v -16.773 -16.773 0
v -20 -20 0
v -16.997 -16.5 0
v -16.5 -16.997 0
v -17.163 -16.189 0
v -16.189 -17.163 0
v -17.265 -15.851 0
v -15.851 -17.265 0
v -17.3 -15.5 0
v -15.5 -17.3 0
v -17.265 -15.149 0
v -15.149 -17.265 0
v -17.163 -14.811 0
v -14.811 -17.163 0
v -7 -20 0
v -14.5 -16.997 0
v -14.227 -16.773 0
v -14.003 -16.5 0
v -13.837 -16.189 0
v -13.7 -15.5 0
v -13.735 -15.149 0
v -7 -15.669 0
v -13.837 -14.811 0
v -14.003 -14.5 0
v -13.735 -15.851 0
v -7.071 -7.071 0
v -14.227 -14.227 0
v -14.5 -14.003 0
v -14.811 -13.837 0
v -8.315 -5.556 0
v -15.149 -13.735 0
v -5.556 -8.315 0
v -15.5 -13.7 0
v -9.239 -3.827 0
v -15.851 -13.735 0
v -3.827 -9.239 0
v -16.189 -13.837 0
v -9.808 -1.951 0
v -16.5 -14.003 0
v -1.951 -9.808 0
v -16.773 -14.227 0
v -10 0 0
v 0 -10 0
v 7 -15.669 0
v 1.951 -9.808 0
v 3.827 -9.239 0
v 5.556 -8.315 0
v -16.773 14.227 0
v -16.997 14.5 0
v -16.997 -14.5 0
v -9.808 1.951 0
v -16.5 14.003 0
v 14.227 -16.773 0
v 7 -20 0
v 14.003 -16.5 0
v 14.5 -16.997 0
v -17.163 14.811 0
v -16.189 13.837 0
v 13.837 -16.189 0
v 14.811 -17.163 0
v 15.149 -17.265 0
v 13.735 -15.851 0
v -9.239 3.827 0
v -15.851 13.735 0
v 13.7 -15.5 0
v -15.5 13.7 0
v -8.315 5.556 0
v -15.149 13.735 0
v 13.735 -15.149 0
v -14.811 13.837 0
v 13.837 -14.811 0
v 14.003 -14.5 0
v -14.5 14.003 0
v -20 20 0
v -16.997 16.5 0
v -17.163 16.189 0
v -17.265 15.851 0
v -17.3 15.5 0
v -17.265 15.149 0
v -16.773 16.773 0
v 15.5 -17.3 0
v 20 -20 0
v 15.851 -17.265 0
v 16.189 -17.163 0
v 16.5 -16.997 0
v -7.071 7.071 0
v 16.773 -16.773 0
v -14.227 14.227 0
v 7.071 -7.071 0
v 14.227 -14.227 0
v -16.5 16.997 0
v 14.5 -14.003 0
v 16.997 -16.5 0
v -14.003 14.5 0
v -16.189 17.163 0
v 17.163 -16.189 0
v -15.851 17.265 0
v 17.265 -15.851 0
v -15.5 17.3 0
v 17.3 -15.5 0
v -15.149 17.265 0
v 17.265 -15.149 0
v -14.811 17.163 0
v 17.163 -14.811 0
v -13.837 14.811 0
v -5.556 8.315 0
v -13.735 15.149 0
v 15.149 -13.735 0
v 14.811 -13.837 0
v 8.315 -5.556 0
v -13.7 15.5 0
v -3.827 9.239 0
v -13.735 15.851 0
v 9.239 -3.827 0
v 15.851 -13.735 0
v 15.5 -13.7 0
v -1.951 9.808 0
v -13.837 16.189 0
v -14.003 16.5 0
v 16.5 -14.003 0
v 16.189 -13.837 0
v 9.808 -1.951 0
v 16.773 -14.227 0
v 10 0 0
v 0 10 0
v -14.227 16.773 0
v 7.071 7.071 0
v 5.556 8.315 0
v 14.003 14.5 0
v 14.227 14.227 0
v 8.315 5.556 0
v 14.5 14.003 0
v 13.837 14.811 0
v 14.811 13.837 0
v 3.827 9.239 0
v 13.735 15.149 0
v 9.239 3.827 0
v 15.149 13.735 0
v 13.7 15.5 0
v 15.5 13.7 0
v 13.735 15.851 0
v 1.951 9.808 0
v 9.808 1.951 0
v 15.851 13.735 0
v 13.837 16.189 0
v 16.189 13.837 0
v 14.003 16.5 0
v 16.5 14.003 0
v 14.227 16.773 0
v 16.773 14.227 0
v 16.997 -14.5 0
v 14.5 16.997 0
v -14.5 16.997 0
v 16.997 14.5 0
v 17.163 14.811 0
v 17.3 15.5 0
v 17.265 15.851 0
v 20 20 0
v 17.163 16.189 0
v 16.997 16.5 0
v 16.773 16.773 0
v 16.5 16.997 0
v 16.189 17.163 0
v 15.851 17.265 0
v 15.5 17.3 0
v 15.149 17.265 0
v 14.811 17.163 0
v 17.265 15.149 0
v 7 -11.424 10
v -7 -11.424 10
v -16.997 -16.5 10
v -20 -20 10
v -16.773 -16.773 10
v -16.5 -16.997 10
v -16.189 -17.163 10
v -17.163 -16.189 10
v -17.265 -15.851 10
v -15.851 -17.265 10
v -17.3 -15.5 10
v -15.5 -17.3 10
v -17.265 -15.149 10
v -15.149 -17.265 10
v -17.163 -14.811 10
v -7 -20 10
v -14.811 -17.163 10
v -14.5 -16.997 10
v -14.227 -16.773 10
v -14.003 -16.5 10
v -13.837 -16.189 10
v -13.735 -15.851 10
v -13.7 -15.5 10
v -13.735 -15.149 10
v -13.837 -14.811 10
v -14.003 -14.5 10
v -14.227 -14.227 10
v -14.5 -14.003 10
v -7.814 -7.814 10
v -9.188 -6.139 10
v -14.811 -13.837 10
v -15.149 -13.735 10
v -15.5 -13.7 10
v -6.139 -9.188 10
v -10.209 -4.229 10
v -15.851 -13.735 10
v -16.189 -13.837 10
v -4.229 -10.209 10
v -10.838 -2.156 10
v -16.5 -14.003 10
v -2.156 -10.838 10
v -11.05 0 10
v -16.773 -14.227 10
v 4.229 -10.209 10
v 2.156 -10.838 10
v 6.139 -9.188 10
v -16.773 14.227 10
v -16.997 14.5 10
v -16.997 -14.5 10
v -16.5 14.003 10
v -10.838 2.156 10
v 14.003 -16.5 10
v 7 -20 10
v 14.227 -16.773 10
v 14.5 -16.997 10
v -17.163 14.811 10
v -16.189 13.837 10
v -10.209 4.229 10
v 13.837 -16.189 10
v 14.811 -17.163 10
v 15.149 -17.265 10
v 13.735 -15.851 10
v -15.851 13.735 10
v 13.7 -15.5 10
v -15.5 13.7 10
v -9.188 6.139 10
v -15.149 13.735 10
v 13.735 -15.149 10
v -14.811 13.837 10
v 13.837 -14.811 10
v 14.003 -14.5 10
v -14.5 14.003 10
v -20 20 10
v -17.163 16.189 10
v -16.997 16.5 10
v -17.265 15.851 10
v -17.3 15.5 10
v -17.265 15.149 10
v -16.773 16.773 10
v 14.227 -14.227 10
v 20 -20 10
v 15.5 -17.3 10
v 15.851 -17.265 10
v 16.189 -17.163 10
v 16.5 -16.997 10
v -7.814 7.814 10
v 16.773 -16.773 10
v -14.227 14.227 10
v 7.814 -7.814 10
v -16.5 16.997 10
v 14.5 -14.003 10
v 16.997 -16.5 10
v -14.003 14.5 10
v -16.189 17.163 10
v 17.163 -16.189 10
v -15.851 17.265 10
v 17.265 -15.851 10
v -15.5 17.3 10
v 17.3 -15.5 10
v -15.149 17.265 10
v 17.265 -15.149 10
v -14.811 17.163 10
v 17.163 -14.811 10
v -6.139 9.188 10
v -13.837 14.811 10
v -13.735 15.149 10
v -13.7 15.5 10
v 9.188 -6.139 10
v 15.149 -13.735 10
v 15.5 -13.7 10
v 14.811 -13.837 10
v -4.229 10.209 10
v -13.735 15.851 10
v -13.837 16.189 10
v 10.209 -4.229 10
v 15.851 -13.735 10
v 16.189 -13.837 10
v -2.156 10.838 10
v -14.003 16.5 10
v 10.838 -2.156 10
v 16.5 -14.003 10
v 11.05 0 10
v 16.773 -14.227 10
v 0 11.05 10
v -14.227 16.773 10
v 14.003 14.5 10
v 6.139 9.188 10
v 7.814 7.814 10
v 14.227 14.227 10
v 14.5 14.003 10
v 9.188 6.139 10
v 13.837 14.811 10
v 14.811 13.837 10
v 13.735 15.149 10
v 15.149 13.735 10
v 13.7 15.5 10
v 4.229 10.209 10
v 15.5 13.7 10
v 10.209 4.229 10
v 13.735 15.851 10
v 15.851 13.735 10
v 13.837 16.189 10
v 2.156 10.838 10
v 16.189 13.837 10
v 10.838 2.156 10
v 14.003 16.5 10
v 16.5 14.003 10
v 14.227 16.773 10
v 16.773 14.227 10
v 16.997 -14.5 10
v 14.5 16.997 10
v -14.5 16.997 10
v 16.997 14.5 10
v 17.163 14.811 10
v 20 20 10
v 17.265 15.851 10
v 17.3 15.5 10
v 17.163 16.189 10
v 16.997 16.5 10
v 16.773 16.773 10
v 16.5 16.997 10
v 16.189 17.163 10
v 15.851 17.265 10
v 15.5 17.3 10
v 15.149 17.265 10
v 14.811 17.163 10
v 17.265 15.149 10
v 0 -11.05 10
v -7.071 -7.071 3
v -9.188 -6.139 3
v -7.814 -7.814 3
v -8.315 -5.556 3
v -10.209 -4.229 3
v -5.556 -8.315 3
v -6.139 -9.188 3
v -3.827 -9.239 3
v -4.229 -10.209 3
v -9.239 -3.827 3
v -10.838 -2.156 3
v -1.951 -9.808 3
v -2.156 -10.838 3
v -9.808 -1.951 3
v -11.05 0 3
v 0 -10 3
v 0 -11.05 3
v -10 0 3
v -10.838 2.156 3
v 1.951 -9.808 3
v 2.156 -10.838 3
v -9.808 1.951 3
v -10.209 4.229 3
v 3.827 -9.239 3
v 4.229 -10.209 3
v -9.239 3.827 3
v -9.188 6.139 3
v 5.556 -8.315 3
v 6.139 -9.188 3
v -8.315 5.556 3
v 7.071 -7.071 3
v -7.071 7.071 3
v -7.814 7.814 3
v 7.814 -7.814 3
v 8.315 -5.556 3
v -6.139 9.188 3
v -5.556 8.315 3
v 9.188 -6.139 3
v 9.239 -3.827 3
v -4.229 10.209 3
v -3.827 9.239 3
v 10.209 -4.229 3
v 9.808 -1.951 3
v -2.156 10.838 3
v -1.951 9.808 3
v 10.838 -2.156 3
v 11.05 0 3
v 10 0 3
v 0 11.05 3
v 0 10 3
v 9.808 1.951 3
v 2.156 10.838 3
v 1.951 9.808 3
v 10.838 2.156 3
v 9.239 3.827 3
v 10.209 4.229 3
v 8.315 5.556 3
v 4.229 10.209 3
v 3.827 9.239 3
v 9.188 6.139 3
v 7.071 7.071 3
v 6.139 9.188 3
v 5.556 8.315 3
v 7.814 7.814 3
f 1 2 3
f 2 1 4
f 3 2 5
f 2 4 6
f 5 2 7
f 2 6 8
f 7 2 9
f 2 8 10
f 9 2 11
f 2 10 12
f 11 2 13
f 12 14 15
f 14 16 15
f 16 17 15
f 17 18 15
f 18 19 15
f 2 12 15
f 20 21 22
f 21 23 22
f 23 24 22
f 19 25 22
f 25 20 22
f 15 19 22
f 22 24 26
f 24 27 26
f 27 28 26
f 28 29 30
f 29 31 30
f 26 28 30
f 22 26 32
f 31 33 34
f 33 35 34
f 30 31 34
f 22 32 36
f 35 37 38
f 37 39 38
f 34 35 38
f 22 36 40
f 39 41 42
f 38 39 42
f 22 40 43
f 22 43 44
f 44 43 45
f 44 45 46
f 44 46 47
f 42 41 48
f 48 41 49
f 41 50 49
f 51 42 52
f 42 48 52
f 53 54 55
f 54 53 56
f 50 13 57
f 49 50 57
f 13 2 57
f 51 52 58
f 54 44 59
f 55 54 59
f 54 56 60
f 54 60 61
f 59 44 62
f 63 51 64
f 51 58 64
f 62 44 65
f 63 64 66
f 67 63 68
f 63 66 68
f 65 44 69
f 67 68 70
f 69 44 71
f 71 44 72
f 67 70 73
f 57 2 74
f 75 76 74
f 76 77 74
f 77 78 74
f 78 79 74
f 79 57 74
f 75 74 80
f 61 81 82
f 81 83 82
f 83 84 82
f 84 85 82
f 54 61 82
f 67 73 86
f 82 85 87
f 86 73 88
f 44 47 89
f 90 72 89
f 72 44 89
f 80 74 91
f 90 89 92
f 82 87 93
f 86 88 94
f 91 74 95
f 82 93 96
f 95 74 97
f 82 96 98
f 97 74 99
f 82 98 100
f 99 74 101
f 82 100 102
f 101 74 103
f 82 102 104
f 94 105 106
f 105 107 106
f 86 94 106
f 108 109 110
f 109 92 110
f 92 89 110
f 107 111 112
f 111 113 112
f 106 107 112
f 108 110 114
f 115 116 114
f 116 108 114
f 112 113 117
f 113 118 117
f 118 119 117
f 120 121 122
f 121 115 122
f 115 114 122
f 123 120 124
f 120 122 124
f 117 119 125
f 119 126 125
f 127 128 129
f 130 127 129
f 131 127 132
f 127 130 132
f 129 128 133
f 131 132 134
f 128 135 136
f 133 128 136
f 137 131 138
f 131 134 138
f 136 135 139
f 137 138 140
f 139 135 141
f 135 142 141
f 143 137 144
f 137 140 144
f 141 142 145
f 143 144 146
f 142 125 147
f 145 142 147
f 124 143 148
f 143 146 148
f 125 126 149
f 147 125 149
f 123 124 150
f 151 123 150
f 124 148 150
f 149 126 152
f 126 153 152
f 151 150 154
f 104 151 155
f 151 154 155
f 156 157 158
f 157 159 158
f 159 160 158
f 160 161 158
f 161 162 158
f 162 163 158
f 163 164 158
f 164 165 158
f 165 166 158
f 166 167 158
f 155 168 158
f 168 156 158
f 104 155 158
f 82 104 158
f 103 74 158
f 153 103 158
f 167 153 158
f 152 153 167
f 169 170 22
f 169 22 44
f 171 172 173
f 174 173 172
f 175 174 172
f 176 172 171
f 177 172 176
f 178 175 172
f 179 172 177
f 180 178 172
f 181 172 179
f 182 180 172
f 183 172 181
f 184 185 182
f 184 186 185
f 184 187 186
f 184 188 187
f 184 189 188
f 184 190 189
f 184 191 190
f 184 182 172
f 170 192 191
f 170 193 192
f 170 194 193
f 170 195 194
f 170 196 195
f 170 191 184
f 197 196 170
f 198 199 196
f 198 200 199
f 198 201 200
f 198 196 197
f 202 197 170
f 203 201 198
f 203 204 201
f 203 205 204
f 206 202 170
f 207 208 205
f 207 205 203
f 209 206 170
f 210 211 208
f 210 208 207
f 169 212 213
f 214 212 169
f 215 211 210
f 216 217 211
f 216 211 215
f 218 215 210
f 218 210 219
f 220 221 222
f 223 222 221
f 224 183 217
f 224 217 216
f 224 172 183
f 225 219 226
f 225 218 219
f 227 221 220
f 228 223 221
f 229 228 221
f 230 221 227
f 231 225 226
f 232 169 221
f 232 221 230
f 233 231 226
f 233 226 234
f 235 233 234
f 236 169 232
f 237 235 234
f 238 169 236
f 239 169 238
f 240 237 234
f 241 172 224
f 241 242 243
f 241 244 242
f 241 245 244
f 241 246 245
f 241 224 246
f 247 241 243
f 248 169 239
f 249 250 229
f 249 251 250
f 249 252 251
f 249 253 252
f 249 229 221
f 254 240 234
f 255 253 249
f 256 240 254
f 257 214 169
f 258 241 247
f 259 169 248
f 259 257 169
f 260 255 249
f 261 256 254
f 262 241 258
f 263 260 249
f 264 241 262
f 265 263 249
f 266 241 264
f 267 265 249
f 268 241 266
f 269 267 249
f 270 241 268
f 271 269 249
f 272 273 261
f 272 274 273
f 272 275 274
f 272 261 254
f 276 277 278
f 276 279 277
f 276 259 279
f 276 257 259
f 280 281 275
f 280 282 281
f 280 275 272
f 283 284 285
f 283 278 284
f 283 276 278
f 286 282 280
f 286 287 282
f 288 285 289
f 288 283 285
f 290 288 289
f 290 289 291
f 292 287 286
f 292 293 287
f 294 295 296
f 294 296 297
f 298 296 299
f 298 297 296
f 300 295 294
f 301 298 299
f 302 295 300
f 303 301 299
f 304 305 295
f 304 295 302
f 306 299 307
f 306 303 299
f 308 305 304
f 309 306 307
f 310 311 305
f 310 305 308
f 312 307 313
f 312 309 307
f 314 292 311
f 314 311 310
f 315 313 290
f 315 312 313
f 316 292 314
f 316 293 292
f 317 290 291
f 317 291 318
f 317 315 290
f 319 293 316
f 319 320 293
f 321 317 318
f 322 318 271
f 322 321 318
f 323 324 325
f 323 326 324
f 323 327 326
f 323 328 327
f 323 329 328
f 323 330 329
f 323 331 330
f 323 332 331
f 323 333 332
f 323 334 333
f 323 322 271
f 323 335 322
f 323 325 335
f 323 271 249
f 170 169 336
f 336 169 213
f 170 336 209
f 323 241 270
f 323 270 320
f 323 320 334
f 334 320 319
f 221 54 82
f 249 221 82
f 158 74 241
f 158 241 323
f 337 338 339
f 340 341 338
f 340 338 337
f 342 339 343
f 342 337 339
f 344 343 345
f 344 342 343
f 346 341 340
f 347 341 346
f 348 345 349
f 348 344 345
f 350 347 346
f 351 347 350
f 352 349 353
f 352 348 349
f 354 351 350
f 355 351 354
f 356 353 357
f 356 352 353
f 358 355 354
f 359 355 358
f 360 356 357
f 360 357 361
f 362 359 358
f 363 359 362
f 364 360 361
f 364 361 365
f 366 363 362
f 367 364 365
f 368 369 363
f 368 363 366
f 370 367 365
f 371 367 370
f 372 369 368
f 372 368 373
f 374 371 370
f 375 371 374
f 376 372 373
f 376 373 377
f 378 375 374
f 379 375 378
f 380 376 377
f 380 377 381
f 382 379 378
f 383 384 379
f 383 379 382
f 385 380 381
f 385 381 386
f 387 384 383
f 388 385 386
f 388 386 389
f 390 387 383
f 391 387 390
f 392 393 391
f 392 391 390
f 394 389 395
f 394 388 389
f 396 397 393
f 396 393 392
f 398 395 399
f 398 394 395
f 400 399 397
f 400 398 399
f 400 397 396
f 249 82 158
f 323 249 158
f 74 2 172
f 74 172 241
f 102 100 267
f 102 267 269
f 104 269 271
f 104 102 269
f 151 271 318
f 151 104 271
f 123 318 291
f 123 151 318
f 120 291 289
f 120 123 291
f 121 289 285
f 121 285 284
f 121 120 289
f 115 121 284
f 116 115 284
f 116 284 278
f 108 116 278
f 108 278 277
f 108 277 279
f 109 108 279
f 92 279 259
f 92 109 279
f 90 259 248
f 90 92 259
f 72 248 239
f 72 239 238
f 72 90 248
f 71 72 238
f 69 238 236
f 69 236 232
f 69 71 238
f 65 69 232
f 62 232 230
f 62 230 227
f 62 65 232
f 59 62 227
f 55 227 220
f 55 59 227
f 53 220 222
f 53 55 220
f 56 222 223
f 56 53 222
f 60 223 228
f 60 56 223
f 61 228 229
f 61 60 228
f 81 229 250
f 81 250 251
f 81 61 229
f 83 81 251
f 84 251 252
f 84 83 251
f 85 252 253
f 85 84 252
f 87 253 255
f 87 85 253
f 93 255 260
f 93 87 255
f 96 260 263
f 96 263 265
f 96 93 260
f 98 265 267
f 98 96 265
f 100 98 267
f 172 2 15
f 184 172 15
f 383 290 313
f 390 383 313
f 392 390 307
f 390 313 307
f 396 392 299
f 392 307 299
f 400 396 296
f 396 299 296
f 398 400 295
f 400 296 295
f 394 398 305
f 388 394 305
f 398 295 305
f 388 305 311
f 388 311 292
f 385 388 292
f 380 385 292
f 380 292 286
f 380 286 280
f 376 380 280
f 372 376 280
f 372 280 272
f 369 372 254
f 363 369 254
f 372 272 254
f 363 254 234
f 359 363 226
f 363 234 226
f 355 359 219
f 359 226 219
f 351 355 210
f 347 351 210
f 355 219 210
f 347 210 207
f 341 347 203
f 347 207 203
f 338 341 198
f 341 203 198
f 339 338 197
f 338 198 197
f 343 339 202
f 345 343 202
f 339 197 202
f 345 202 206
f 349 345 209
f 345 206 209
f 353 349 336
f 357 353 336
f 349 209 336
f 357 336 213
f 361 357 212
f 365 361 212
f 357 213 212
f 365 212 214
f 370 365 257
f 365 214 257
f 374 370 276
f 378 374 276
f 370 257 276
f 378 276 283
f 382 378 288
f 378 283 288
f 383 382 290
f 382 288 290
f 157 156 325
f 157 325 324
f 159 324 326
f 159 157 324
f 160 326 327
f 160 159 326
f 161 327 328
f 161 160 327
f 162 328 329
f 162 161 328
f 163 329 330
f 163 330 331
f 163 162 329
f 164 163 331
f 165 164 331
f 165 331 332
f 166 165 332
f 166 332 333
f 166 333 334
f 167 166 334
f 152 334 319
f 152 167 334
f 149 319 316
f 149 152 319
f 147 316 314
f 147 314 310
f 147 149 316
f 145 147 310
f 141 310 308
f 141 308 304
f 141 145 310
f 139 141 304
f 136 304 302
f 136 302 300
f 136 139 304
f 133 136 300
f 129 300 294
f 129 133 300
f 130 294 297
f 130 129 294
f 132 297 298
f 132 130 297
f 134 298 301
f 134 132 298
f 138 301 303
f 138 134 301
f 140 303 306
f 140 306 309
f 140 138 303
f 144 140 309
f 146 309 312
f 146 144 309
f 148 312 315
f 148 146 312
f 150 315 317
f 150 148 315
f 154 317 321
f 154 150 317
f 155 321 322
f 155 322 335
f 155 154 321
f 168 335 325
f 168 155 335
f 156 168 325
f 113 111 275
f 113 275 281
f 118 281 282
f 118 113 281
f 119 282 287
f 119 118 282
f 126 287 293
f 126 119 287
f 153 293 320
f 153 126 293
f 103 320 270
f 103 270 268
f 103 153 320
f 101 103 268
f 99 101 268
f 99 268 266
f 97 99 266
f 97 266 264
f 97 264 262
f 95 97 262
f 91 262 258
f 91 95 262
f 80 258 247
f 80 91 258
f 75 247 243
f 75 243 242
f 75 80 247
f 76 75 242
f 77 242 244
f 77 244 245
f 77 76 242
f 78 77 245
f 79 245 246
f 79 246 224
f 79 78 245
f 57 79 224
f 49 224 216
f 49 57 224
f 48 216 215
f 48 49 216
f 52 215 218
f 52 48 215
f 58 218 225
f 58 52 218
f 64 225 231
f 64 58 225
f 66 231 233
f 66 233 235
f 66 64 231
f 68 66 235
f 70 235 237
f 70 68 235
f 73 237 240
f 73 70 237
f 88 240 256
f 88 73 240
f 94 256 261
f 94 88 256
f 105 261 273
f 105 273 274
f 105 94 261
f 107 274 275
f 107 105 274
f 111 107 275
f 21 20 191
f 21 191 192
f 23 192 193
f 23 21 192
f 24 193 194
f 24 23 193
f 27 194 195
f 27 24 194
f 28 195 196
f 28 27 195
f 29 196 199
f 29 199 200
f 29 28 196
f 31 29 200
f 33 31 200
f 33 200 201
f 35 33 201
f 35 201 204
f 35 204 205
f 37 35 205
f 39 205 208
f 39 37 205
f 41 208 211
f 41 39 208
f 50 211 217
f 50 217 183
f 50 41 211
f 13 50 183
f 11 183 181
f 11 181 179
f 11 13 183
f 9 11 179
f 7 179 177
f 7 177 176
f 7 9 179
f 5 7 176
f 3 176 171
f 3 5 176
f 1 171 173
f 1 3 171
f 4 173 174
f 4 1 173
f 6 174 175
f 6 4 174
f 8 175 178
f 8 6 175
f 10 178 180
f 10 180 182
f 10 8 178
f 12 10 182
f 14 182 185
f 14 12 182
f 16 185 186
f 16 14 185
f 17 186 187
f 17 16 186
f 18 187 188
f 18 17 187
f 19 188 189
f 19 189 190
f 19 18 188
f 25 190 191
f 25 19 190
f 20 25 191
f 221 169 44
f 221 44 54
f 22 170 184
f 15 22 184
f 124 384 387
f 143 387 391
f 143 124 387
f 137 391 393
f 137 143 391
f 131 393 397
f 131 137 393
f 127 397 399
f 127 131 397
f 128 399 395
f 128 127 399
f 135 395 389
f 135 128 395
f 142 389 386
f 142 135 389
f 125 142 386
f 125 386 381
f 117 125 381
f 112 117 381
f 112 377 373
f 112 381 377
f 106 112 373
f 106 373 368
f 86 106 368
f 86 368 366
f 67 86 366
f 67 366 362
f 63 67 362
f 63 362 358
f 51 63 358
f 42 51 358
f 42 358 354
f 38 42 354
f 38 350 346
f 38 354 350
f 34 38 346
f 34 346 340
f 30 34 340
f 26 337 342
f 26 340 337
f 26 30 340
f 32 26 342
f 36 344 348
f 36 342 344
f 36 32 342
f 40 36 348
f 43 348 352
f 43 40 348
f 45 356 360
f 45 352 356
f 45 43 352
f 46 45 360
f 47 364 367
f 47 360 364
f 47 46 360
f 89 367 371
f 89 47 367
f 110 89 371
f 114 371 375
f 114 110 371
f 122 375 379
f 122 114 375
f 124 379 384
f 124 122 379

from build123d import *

# Parameters (mm, degrees)
BOX_W               = 14
BOX_H               = 10
BOX_DEPTH           = 20
BOX_PLACEMENT_ANGLE = 157
SKETCH_W            = 40
SKETCH_H            = 40
SKETCH_R            = 1.8
SKETCH_R_2          = 10
PAD_DEPTH           = 10
SKETCH001_R         = 11.05
POCKET_DEPTH        = 7


with BuildPart() as cube:
    # Box → Box (new body)
    with BuildSketch(Plane.XY):
        with Locations((7, 5)):
            Rectangle(BOX_W, BOX_H)
    extrude(amount=BOX_DEPTH)


with BuildPart() as cube_1:
    # Box placement: moved
    add(cube.part.moved(Location((-7, -11, 11))).rotate(Axis((-7, -11, 11), (1, 0, 0)), BOX_PLACEMENT_ANGLE))


with BuildPart() as cut:
    # Sketch → Pad (new body)
    with BuildSketch(Plane.XY):
        Rectangle(SKETCH_W, SKETCH_H)
        with Locations((-15.5, 15.5)):
            Circle(SKETCH_R, mode=Mode.SUBTRACT)
        with Locations((15.5, 15.5)):
            Circle(SKETCH_R, mode=Mode.SUBTRACT)
        with Locations((-15.5, -15.5)):
            Circle(SKETCH_R, mode=Mode.SUBTRACT)
        with Locations((15.5, -15.5)):
            Circle(SKETCH_R, mode=Mode.SUBTRACT)
        Circle(SKETCH_R_2, mode=Mode.SUBTRACT)
    extrude(amount=PAD_DEPTH)

    # Sketch001 → Pocket (cut)
    with BuildSketch(Plane.XY.offset(10)):
        Circle(SKETCH001_R)
    extrude(amount=-POCKET_DEPTH, mode=Mode.SUBTRACT)

    # Cut: cut Cube
    add(cube_1.part, mode=Mode.SUBTRACT)


solid = cut.part
